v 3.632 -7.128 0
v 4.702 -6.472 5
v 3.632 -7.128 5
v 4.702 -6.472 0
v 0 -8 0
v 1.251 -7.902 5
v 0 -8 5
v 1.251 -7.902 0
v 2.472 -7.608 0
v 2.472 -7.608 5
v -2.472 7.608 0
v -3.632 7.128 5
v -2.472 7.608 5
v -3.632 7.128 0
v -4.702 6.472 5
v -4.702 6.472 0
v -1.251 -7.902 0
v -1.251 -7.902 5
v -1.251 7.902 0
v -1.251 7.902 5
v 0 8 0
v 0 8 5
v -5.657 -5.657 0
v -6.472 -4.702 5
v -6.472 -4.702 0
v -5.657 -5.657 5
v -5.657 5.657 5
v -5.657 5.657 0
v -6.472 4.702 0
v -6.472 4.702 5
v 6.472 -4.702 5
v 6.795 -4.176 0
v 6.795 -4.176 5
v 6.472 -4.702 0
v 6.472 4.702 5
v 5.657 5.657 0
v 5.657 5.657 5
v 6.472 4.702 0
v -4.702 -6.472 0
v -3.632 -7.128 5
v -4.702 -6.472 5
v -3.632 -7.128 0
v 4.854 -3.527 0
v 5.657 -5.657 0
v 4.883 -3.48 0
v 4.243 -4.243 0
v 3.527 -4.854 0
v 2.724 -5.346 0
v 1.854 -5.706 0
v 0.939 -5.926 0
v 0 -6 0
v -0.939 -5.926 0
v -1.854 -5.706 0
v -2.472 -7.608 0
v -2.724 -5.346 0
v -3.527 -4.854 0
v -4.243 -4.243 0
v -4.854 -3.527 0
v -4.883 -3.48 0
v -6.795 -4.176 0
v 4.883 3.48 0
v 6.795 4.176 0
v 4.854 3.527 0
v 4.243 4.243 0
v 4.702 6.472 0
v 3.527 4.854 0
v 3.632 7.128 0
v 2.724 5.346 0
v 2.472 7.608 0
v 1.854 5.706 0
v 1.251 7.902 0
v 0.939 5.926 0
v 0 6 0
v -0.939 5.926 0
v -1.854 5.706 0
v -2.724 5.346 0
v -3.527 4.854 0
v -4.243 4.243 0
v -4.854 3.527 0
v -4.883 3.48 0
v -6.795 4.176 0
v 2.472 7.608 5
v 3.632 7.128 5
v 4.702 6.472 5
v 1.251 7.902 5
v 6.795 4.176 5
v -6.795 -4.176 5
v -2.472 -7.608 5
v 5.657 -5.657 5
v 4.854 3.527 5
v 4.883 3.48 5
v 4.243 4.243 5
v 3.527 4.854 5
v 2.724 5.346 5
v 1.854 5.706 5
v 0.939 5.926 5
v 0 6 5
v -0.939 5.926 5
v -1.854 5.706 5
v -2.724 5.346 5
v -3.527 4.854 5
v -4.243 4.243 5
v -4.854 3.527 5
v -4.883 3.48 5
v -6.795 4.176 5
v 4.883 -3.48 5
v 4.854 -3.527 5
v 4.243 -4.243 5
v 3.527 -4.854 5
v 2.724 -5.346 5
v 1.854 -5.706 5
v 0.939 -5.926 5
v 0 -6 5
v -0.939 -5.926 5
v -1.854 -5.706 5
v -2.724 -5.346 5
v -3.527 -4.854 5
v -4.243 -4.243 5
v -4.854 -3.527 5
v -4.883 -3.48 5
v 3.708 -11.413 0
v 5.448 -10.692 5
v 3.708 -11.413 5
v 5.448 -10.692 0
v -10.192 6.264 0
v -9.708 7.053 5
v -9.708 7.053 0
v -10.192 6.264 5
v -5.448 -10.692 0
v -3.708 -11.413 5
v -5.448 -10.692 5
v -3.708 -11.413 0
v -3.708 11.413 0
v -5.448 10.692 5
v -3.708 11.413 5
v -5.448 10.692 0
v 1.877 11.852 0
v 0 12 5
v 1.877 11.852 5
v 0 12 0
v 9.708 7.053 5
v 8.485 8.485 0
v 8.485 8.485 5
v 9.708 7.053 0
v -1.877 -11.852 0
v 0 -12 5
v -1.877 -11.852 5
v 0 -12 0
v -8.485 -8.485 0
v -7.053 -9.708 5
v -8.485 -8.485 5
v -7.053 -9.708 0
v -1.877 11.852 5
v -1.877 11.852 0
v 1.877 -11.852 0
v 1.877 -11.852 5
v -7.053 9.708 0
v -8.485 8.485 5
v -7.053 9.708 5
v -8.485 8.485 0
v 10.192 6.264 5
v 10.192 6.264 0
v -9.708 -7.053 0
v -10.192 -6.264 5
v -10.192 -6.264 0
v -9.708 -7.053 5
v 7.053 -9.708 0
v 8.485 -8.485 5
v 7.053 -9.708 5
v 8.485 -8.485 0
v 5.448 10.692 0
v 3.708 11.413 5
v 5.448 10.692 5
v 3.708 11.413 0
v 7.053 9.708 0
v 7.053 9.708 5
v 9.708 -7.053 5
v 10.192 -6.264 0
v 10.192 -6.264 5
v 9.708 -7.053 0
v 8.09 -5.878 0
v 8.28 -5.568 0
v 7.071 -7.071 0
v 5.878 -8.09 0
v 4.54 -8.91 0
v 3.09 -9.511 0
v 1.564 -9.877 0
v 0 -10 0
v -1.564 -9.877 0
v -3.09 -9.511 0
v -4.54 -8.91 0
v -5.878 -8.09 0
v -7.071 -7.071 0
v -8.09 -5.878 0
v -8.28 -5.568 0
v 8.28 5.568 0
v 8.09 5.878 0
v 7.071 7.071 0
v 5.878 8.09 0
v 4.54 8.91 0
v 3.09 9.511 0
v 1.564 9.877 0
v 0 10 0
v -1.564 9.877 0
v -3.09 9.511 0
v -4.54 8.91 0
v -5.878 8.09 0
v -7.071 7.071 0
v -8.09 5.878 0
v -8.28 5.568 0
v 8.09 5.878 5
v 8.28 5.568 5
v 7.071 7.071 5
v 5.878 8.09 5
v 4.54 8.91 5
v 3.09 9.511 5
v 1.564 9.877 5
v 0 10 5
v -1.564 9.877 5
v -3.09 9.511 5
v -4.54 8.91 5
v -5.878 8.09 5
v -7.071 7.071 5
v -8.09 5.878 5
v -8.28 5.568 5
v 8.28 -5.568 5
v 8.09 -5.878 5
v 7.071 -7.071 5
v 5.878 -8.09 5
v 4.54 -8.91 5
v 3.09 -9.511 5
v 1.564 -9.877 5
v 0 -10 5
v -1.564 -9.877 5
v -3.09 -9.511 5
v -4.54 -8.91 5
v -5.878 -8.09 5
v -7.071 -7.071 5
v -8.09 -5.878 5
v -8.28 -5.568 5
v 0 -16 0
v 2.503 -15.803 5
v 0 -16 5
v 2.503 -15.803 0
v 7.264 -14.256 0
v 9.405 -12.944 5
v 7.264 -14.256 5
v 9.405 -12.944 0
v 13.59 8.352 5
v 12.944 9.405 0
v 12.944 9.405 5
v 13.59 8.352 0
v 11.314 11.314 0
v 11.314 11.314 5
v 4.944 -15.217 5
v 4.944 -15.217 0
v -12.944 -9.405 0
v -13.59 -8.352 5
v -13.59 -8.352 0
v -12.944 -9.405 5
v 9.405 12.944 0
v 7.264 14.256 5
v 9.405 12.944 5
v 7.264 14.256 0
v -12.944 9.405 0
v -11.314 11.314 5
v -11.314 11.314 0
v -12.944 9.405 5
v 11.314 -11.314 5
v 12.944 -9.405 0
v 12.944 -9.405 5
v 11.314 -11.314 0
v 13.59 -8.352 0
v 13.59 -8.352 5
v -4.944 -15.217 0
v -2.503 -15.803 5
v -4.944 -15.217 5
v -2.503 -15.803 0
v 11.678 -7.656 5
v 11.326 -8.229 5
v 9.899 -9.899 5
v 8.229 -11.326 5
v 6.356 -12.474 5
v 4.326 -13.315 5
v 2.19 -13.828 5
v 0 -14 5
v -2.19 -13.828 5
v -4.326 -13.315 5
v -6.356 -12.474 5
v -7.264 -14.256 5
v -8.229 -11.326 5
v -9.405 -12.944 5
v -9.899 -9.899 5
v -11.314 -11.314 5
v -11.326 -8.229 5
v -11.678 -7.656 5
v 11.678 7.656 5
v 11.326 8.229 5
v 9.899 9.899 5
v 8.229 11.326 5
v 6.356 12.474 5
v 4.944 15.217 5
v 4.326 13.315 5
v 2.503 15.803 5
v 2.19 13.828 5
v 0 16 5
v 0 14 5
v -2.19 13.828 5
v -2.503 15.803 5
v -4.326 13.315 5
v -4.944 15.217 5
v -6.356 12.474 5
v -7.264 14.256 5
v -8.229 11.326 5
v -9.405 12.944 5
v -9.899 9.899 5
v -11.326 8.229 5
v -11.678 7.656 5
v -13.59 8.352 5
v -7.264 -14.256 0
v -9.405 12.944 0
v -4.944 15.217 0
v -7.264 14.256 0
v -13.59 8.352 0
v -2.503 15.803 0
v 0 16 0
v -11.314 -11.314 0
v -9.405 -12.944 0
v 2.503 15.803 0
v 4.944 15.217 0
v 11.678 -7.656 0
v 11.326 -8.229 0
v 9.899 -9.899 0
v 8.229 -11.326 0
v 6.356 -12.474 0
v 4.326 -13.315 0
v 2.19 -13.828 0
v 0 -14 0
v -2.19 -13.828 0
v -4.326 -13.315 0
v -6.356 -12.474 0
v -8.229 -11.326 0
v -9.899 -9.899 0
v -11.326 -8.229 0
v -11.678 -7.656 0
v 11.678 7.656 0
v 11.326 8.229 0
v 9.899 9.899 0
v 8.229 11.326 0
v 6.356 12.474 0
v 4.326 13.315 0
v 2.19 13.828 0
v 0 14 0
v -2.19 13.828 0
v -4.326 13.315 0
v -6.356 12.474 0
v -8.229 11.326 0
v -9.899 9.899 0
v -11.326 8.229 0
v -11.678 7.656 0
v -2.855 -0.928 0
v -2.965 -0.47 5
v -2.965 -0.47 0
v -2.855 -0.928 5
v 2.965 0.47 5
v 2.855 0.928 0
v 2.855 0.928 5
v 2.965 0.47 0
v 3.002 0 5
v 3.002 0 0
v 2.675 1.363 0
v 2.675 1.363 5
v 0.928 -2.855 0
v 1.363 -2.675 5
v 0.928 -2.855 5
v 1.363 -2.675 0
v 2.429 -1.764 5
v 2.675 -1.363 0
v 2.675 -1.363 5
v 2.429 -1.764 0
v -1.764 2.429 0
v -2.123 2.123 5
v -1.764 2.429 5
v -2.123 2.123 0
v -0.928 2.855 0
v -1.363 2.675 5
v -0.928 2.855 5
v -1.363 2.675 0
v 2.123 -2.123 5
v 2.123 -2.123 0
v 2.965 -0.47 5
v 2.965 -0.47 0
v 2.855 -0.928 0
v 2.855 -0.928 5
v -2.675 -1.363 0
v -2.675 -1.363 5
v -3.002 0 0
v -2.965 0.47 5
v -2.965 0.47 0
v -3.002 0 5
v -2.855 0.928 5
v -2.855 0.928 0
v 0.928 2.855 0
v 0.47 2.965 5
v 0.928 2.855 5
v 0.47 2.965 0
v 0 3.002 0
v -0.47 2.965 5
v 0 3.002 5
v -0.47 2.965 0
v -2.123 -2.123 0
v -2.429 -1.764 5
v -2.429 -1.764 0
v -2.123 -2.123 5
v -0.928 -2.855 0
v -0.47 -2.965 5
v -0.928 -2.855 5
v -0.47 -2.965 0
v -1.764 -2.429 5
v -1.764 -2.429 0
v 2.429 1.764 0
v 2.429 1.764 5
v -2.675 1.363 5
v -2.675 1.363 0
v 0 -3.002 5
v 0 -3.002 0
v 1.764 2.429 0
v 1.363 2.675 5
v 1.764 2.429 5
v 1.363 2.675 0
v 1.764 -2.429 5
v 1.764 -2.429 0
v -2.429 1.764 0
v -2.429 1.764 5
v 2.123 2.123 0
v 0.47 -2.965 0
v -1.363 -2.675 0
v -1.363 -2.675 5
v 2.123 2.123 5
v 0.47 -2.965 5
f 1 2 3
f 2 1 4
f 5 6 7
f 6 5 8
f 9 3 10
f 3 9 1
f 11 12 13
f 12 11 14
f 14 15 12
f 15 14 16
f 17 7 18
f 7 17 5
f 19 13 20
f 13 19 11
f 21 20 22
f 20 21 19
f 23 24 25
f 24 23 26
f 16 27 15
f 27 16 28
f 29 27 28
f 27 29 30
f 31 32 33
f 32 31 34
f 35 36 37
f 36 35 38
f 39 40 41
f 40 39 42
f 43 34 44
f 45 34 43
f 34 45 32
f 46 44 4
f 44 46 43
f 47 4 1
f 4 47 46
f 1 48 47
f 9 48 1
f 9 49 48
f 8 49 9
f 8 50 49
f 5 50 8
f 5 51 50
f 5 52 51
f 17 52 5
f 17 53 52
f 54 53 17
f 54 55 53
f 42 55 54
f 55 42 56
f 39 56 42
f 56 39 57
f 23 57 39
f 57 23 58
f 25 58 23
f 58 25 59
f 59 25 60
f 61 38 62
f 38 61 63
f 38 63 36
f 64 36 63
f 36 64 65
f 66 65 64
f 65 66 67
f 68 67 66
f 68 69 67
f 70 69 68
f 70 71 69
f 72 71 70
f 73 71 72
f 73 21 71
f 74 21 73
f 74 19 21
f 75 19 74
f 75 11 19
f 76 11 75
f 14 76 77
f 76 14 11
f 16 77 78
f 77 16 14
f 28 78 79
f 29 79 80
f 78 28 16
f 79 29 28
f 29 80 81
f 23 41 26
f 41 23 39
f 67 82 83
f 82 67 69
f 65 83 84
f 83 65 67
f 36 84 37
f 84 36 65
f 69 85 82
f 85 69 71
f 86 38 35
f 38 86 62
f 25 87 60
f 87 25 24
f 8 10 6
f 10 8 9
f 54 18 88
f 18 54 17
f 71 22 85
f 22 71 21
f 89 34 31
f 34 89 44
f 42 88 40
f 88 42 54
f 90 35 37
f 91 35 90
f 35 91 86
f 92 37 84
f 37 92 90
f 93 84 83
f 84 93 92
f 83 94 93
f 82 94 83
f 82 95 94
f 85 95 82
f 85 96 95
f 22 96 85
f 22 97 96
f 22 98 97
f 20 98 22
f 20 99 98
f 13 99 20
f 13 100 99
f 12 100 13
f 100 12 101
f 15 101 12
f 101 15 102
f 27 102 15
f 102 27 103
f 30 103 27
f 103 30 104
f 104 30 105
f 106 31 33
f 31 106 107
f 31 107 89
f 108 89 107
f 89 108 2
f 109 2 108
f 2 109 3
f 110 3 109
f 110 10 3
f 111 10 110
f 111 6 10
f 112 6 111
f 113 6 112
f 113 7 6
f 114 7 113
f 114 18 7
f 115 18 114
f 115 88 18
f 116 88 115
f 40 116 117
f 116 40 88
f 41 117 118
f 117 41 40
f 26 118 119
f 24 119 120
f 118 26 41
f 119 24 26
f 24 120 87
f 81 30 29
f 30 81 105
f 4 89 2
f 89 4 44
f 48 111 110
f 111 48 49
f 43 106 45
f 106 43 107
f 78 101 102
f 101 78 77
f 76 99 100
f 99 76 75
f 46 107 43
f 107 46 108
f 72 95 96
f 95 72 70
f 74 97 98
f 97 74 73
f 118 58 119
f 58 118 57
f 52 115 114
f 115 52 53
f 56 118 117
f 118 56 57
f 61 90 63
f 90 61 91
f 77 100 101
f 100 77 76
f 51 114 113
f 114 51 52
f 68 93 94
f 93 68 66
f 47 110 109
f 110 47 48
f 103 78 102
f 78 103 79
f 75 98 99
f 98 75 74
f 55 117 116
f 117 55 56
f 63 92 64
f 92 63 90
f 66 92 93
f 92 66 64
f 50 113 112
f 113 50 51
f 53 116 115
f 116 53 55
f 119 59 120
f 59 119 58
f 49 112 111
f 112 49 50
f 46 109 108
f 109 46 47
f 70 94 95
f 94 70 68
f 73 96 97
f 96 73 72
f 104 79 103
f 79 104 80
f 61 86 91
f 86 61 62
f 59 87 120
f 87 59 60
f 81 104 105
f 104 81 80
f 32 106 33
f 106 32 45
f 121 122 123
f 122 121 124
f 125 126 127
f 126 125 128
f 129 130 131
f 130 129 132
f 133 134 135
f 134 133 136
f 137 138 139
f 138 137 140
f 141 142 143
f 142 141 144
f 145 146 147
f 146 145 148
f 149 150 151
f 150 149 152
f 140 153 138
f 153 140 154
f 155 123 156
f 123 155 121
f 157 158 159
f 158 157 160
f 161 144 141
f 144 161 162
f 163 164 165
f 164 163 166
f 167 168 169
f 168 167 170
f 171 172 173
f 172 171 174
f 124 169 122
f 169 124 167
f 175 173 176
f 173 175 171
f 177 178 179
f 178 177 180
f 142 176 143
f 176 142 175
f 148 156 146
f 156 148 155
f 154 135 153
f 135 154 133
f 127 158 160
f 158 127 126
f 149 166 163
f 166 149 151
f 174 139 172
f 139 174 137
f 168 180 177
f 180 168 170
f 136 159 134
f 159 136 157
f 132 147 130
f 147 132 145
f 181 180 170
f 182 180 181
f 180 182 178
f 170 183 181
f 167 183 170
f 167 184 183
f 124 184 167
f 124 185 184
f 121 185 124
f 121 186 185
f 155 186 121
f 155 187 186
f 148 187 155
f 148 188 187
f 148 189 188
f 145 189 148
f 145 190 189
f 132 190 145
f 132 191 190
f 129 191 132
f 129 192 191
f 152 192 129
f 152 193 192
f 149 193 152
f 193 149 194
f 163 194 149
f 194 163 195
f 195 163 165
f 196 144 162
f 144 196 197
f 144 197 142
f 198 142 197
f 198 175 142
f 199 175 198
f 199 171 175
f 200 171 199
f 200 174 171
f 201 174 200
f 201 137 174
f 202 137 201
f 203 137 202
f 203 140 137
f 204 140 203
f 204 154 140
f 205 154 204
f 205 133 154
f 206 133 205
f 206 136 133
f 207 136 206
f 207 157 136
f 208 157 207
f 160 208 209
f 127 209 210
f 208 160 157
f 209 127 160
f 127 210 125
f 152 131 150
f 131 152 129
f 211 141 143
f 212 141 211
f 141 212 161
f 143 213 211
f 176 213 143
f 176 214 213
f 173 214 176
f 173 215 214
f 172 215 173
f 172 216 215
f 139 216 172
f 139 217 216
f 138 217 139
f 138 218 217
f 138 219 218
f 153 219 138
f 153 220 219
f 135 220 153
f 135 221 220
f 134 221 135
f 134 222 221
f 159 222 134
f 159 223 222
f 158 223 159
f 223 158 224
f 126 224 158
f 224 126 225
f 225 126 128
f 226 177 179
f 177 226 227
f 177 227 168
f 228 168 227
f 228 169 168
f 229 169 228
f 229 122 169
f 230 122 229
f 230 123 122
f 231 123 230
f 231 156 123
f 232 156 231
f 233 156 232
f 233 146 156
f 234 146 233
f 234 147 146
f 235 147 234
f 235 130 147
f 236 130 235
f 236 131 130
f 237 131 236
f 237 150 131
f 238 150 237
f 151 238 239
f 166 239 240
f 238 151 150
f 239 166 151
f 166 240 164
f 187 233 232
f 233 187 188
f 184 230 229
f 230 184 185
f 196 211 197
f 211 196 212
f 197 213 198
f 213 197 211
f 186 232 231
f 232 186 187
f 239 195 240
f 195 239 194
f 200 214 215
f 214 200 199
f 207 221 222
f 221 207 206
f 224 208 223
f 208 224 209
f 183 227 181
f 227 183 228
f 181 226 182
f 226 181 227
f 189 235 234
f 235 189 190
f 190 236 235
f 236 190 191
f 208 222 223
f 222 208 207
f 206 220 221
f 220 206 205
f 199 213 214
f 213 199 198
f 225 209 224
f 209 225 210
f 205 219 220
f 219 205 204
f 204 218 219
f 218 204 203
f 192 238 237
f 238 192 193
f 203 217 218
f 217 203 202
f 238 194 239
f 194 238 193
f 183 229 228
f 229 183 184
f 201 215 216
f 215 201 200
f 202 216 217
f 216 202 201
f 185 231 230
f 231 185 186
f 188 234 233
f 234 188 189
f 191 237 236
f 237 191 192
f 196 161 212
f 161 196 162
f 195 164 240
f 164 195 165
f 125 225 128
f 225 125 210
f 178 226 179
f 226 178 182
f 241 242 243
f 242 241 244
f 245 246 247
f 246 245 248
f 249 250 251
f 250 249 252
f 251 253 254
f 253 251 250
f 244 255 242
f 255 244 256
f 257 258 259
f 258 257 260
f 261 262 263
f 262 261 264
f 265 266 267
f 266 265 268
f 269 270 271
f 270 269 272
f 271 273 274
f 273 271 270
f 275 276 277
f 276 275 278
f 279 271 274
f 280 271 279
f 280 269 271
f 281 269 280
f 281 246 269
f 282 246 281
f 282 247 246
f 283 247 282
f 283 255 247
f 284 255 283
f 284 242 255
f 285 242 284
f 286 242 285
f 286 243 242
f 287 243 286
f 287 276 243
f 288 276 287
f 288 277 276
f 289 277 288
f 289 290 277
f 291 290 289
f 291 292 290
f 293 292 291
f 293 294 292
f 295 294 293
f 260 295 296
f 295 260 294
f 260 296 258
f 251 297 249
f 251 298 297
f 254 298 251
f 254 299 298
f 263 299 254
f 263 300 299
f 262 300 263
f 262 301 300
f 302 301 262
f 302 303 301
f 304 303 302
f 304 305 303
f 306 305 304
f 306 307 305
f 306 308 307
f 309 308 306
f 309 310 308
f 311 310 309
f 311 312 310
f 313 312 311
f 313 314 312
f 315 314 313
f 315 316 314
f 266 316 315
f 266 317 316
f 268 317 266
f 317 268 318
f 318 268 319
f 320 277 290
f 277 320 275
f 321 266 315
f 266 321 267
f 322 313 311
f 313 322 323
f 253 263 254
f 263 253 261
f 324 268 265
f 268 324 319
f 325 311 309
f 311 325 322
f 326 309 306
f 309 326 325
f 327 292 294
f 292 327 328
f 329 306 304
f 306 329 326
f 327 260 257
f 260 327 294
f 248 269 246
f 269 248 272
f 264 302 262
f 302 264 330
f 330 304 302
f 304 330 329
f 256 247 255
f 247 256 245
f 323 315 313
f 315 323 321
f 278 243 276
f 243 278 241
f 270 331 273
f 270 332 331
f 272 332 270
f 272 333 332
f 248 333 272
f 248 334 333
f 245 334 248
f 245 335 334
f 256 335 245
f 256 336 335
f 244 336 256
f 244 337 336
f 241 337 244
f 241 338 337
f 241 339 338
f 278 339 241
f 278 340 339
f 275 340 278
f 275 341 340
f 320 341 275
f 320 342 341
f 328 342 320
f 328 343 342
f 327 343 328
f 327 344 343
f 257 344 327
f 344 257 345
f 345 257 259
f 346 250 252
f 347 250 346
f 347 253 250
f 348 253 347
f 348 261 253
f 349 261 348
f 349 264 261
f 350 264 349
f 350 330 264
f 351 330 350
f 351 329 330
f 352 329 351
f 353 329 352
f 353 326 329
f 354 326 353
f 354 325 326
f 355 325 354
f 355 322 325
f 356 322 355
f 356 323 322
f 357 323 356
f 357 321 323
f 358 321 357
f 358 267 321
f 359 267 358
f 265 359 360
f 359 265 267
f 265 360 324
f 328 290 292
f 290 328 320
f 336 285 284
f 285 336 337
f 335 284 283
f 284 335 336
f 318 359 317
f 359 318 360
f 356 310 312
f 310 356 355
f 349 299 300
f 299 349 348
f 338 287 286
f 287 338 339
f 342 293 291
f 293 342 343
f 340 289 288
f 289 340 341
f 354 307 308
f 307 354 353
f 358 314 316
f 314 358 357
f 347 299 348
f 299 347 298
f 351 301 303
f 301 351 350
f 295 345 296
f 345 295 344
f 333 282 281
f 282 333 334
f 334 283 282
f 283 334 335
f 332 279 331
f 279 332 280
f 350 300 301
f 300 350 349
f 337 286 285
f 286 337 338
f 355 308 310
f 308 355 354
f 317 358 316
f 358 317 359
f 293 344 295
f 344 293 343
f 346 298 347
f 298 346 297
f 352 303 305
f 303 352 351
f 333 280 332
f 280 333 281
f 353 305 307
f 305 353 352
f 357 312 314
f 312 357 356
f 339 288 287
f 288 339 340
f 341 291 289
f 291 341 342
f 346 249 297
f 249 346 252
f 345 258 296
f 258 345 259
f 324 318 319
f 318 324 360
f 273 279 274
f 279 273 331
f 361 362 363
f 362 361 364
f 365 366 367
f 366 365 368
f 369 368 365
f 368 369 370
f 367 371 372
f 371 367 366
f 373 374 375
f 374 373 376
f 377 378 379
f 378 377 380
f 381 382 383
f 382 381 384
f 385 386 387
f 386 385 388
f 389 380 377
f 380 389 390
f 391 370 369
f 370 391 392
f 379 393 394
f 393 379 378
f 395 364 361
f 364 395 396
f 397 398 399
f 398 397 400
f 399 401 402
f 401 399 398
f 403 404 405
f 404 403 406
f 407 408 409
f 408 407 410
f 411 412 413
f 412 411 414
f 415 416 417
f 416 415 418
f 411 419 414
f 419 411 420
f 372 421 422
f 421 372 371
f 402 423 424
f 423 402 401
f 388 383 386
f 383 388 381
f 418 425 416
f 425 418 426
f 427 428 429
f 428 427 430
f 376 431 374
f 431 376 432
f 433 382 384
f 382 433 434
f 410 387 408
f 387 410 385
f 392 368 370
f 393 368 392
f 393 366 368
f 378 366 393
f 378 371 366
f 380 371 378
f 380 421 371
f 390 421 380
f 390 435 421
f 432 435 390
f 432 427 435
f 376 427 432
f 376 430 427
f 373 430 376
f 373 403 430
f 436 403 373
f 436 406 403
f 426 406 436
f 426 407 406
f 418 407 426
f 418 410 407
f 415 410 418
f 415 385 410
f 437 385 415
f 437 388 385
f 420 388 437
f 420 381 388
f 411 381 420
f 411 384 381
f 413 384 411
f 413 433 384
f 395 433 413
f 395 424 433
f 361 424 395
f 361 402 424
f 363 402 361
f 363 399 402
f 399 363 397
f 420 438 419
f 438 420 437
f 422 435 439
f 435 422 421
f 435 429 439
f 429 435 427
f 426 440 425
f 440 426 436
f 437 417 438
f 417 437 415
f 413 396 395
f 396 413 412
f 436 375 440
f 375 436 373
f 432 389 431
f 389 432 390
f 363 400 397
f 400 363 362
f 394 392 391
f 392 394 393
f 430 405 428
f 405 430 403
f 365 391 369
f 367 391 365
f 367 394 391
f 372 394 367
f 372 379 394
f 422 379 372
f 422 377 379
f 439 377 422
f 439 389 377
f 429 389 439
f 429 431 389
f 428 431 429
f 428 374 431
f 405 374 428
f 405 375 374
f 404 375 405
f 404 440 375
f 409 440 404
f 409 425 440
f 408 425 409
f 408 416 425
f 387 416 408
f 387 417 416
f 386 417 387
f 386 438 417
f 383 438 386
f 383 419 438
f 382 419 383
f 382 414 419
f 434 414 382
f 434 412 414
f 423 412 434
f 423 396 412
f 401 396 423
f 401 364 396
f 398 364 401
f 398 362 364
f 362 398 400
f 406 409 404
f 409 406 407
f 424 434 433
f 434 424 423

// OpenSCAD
/* NFC Like Logo */
/* Loic - August 2017 */

nfc_logo(16,5);

module nfc_logo(diam,height)
{
    cylinder(height,diam/5.33,diam/5.33,$fn=40);
    waves(height,diam*0.5,diam/8);
    waves(height,diam*0.75,diam/8);
    waves(height,diam,diam/8);
}

module waves(height,ext_diam,spacing)
{
    $fn = 40;
    int_diam = ext_diam - spacing;
    rect_len = 2.4 * ext_diam;
    rect_height = 3 * height;
    
    difference()
    {
        difference()
        {
            cylinder(height,ext_diam,ext_diam);
            translate([0,0,-1])
              cylinder(height+2,int_diam,int_diam);
        }
        
        cube([rect_len,ext_diam*0.4,rect_height],true);
        
        rotate(20)
            cube([rect_len,ext_diam*0.4,rect_height],true);
        rotate(-20)
            cube([rect_len,ext_diam*0.4,rect_height],true);
    }
}
